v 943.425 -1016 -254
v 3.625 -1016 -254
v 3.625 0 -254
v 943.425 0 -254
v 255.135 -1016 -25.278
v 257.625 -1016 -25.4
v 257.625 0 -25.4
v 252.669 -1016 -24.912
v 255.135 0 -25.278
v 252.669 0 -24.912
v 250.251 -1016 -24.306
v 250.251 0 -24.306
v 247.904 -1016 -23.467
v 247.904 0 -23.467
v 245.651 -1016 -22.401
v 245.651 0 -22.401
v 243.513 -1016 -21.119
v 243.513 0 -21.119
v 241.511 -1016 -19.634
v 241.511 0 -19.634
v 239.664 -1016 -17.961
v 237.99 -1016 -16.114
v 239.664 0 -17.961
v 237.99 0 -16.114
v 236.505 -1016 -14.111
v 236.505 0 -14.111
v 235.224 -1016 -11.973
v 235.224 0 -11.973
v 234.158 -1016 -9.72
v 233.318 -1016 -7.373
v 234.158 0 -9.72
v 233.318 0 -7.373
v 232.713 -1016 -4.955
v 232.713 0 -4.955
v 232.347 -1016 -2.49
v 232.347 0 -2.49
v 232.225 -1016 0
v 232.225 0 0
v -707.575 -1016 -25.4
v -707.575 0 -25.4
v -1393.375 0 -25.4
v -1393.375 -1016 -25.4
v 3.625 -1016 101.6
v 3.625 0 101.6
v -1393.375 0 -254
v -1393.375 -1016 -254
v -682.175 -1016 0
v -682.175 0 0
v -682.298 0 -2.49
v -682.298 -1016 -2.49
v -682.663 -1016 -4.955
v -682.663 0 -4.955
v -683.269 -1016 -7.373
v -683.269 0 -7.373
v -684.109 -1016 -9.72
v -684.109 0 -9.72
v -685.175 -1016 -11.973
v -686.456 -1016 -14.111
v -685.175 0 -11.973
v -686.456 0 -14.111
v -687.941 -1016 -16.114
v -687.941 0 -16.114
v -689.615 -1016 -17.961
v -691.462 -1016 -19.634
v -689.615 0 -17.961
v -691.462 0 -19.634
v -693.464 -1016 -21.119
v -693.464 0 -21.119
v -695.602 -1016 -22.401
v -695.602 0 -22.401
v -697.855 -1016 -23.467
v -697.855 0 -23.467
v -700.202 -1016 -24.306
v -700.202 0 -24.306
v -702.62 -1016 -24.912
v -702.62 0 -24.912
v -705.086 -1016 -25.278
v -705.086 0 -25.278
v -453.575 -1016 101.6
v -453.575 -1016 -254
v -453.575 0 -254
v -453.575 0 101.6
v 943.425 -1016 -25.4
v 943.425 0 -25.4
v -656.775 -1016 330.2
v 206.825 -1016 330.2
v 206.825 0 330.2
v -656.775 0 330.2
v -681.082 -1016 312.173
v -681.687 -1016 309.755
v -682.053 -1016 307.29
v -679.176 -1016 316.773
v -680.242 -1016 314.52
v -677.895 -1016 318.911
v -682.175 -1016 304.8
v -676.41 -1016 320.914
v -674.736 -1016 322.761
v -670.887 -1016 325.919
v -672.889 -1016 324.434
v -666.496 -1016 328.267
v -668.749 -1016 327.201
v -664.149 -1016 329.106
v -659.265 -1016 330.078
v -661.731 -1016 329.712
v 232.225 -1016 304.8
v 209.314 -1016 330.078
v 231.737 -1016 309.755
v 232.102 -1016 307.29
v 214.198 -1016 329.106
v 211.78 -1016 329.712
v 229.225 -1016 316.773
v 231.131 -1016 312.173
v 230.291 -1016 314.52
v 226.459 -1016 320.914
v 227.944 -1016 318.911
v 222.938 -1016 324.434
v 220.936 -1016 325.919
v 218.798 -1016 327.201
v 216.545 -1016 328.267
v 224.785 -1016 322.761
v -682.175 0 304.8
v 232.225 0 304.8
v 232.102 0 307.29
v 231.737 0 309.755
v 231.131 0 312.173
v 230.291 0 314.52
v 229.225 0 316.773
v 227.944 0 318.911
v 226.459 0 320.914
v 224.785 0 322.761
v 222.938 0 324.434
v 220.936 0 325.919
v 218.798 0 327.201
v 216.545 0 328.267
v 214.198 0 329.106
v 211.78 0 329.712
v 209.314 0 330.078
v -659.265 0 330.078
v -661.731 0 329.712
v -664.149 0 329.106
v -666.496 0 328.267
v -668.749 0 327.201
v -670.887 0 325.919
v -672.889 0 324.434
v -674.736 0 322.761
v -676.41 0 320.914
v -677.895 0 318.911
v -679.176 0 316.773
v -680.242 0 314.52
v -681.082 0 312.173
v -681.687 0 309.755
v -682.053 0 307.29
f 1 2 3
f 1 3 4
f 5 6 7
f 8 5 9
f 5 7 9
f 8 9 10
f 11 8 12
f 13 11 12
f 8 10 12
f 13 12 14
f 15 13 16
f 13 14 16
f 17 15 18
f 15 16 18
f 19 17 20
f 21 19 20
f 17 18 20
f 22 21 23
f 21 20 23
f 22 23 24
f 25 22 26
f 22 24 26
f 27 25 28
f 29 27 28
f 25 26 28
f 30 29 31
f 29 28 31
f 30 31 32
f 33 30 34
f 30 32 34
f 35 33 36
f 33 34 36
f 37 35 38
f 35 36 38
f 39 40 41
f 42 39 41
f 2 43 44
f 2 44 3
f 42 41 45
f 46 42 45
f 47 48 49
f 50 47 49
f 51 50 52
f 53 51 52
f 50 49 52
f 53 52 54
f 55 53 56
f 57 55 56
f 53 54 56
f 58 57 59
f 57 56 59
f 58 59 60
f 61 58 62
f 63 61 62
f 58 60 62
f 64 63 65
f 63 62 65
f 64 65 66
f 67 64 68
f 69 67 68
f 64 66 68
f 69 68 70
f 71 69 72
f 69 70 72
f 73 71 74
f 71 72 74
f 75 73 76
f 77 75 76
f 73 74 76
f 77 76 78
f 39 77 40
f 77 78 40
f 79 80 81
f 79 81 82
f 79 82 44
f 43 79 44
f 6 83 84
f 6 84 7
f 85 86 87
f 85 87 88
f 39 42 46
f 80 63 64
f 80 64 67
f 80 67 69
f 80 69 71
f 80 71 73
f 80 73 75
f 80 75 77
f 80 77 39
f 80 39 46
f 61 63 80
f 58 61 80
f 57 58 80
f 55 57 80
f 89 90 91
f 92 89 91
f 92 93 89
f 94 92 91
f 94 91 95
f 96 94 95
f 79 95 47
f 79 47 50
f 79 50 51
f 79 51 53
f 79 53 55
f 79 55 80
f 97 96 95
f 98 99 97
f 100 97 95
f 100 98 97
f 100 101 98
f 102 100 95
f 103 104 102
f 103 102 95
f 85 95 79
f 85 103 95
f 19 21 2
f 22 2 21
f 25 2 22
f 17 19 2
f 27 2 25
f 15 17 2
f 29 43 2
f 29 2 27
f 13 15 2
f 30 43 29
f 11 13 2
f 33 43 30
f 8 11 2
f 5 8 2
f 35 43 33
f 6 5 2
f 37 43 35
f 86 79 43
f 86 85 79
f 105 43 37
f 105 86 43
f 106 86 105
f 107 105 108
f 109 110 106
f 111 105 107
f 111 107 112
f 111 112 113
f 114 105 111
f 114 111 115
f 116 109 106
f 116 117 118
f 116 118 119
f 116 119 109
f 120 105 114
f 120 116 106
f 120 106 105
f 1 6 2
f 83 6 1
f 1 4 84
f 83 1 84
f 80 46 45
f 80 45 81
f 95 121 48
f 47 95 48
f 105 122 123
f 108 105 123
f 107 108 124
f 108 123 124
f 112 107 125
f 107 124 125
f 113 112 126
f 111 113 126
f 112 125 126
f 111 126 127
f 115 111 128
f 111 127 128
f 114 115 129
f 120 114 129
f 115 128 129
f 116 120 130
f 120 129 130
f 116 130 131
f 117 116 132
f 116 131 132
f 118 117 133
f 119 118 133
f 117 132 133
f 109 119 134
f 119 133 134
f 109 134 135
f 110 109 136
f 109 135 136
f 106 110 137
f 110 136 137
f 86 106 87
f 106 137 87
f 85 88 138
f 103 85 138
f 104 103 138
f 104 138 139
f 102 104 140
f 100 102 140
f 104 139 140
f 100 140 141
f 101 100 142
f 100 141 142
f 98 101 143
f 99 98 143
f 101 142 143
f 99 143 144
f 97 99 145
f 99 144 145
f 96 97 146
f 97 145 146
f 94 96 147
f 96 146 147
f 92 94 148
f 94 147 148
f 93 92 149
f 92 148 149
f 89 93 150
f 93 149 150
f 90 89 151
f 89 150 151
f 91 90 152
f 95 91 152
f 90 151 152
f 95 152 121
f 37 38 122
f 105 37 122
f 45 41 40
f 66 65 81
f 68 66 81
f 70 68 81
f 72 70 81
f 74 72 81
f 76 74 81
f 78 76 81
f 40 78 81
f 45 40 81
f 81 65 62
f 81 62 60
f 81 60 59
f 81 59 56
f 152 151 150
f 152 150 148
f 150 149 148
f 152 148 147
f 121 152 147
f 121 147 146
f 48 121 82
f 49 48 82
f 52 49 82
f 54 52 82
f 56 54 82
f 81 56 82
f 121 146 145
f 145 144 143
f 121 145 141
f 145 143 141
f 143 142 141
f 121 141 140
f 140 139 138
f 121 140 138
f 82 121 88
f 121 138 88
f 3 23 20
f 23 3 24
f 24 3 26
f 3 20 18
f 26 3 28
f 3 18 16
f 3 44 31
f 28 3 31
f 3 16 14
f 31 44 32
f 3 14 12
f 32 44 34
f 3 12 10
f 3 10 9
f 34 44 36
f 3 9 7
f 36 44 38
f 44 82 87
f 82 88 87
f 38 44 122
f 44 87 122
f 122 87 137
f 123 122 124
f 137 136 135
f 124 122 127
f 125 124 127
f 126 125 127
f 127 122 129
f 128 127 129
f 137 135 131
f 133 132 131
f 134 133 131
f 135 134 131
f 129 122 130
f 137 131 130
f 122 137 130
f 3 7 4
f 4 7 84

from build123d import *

# Parameters (mm, degrees)
F1_DEPTH = 1016


with BuildPart() as f1:
    # F0 (on Front) → F1 (new body)
    with BuildSketch(Plane.XZ):
        with BuildLine():
            Line((-1393.375381, -25.4), (-1393.375381, -254))
            Line((-1393.375381, -254), (-453.575381, -254))
            Line((-453.575381, -254), (-453.575381, 101.6))
            Line((-453.575381, 101.6), (3.624619, 101.6))
            Line((3.624619, 101.6), (3.624619, -254))
            Line((3.624619, -254), (943.424619, -254))
            Line((943.424619, -254), (943.424619, -25.4))
            Line((943.424619, -25.4), (257.624619, -25.4))
            ThreePointArc((257.624619, -25.4), (239.664107, -17.960512), (232.224619, 0))
            Line((232.224619, 0), (232.224619, 304.8))
            ThreePointArc((232.224619, 304.8), (224.785132, 322.760512), (206.824619, 330.2))
            Line((206.824619, 330.2), (-656.775381, 330.2))
            ThreePointArc((-656.775381, 330.2), (-674.735893, 322.760512), (-682.175381, 304.8))
            Line((-682.175381, 304.8), (-682.175381, 0))
            ThreePointArc((-682.175381, 0), (-689.614868, -17.960512), (-707.575381, -25.4))
            Line((-707.575381, -25.4), (-1393.375381, -25.4))
        make_face()
    extrude(amount=F1_DEPTH)


solid = f1.part
